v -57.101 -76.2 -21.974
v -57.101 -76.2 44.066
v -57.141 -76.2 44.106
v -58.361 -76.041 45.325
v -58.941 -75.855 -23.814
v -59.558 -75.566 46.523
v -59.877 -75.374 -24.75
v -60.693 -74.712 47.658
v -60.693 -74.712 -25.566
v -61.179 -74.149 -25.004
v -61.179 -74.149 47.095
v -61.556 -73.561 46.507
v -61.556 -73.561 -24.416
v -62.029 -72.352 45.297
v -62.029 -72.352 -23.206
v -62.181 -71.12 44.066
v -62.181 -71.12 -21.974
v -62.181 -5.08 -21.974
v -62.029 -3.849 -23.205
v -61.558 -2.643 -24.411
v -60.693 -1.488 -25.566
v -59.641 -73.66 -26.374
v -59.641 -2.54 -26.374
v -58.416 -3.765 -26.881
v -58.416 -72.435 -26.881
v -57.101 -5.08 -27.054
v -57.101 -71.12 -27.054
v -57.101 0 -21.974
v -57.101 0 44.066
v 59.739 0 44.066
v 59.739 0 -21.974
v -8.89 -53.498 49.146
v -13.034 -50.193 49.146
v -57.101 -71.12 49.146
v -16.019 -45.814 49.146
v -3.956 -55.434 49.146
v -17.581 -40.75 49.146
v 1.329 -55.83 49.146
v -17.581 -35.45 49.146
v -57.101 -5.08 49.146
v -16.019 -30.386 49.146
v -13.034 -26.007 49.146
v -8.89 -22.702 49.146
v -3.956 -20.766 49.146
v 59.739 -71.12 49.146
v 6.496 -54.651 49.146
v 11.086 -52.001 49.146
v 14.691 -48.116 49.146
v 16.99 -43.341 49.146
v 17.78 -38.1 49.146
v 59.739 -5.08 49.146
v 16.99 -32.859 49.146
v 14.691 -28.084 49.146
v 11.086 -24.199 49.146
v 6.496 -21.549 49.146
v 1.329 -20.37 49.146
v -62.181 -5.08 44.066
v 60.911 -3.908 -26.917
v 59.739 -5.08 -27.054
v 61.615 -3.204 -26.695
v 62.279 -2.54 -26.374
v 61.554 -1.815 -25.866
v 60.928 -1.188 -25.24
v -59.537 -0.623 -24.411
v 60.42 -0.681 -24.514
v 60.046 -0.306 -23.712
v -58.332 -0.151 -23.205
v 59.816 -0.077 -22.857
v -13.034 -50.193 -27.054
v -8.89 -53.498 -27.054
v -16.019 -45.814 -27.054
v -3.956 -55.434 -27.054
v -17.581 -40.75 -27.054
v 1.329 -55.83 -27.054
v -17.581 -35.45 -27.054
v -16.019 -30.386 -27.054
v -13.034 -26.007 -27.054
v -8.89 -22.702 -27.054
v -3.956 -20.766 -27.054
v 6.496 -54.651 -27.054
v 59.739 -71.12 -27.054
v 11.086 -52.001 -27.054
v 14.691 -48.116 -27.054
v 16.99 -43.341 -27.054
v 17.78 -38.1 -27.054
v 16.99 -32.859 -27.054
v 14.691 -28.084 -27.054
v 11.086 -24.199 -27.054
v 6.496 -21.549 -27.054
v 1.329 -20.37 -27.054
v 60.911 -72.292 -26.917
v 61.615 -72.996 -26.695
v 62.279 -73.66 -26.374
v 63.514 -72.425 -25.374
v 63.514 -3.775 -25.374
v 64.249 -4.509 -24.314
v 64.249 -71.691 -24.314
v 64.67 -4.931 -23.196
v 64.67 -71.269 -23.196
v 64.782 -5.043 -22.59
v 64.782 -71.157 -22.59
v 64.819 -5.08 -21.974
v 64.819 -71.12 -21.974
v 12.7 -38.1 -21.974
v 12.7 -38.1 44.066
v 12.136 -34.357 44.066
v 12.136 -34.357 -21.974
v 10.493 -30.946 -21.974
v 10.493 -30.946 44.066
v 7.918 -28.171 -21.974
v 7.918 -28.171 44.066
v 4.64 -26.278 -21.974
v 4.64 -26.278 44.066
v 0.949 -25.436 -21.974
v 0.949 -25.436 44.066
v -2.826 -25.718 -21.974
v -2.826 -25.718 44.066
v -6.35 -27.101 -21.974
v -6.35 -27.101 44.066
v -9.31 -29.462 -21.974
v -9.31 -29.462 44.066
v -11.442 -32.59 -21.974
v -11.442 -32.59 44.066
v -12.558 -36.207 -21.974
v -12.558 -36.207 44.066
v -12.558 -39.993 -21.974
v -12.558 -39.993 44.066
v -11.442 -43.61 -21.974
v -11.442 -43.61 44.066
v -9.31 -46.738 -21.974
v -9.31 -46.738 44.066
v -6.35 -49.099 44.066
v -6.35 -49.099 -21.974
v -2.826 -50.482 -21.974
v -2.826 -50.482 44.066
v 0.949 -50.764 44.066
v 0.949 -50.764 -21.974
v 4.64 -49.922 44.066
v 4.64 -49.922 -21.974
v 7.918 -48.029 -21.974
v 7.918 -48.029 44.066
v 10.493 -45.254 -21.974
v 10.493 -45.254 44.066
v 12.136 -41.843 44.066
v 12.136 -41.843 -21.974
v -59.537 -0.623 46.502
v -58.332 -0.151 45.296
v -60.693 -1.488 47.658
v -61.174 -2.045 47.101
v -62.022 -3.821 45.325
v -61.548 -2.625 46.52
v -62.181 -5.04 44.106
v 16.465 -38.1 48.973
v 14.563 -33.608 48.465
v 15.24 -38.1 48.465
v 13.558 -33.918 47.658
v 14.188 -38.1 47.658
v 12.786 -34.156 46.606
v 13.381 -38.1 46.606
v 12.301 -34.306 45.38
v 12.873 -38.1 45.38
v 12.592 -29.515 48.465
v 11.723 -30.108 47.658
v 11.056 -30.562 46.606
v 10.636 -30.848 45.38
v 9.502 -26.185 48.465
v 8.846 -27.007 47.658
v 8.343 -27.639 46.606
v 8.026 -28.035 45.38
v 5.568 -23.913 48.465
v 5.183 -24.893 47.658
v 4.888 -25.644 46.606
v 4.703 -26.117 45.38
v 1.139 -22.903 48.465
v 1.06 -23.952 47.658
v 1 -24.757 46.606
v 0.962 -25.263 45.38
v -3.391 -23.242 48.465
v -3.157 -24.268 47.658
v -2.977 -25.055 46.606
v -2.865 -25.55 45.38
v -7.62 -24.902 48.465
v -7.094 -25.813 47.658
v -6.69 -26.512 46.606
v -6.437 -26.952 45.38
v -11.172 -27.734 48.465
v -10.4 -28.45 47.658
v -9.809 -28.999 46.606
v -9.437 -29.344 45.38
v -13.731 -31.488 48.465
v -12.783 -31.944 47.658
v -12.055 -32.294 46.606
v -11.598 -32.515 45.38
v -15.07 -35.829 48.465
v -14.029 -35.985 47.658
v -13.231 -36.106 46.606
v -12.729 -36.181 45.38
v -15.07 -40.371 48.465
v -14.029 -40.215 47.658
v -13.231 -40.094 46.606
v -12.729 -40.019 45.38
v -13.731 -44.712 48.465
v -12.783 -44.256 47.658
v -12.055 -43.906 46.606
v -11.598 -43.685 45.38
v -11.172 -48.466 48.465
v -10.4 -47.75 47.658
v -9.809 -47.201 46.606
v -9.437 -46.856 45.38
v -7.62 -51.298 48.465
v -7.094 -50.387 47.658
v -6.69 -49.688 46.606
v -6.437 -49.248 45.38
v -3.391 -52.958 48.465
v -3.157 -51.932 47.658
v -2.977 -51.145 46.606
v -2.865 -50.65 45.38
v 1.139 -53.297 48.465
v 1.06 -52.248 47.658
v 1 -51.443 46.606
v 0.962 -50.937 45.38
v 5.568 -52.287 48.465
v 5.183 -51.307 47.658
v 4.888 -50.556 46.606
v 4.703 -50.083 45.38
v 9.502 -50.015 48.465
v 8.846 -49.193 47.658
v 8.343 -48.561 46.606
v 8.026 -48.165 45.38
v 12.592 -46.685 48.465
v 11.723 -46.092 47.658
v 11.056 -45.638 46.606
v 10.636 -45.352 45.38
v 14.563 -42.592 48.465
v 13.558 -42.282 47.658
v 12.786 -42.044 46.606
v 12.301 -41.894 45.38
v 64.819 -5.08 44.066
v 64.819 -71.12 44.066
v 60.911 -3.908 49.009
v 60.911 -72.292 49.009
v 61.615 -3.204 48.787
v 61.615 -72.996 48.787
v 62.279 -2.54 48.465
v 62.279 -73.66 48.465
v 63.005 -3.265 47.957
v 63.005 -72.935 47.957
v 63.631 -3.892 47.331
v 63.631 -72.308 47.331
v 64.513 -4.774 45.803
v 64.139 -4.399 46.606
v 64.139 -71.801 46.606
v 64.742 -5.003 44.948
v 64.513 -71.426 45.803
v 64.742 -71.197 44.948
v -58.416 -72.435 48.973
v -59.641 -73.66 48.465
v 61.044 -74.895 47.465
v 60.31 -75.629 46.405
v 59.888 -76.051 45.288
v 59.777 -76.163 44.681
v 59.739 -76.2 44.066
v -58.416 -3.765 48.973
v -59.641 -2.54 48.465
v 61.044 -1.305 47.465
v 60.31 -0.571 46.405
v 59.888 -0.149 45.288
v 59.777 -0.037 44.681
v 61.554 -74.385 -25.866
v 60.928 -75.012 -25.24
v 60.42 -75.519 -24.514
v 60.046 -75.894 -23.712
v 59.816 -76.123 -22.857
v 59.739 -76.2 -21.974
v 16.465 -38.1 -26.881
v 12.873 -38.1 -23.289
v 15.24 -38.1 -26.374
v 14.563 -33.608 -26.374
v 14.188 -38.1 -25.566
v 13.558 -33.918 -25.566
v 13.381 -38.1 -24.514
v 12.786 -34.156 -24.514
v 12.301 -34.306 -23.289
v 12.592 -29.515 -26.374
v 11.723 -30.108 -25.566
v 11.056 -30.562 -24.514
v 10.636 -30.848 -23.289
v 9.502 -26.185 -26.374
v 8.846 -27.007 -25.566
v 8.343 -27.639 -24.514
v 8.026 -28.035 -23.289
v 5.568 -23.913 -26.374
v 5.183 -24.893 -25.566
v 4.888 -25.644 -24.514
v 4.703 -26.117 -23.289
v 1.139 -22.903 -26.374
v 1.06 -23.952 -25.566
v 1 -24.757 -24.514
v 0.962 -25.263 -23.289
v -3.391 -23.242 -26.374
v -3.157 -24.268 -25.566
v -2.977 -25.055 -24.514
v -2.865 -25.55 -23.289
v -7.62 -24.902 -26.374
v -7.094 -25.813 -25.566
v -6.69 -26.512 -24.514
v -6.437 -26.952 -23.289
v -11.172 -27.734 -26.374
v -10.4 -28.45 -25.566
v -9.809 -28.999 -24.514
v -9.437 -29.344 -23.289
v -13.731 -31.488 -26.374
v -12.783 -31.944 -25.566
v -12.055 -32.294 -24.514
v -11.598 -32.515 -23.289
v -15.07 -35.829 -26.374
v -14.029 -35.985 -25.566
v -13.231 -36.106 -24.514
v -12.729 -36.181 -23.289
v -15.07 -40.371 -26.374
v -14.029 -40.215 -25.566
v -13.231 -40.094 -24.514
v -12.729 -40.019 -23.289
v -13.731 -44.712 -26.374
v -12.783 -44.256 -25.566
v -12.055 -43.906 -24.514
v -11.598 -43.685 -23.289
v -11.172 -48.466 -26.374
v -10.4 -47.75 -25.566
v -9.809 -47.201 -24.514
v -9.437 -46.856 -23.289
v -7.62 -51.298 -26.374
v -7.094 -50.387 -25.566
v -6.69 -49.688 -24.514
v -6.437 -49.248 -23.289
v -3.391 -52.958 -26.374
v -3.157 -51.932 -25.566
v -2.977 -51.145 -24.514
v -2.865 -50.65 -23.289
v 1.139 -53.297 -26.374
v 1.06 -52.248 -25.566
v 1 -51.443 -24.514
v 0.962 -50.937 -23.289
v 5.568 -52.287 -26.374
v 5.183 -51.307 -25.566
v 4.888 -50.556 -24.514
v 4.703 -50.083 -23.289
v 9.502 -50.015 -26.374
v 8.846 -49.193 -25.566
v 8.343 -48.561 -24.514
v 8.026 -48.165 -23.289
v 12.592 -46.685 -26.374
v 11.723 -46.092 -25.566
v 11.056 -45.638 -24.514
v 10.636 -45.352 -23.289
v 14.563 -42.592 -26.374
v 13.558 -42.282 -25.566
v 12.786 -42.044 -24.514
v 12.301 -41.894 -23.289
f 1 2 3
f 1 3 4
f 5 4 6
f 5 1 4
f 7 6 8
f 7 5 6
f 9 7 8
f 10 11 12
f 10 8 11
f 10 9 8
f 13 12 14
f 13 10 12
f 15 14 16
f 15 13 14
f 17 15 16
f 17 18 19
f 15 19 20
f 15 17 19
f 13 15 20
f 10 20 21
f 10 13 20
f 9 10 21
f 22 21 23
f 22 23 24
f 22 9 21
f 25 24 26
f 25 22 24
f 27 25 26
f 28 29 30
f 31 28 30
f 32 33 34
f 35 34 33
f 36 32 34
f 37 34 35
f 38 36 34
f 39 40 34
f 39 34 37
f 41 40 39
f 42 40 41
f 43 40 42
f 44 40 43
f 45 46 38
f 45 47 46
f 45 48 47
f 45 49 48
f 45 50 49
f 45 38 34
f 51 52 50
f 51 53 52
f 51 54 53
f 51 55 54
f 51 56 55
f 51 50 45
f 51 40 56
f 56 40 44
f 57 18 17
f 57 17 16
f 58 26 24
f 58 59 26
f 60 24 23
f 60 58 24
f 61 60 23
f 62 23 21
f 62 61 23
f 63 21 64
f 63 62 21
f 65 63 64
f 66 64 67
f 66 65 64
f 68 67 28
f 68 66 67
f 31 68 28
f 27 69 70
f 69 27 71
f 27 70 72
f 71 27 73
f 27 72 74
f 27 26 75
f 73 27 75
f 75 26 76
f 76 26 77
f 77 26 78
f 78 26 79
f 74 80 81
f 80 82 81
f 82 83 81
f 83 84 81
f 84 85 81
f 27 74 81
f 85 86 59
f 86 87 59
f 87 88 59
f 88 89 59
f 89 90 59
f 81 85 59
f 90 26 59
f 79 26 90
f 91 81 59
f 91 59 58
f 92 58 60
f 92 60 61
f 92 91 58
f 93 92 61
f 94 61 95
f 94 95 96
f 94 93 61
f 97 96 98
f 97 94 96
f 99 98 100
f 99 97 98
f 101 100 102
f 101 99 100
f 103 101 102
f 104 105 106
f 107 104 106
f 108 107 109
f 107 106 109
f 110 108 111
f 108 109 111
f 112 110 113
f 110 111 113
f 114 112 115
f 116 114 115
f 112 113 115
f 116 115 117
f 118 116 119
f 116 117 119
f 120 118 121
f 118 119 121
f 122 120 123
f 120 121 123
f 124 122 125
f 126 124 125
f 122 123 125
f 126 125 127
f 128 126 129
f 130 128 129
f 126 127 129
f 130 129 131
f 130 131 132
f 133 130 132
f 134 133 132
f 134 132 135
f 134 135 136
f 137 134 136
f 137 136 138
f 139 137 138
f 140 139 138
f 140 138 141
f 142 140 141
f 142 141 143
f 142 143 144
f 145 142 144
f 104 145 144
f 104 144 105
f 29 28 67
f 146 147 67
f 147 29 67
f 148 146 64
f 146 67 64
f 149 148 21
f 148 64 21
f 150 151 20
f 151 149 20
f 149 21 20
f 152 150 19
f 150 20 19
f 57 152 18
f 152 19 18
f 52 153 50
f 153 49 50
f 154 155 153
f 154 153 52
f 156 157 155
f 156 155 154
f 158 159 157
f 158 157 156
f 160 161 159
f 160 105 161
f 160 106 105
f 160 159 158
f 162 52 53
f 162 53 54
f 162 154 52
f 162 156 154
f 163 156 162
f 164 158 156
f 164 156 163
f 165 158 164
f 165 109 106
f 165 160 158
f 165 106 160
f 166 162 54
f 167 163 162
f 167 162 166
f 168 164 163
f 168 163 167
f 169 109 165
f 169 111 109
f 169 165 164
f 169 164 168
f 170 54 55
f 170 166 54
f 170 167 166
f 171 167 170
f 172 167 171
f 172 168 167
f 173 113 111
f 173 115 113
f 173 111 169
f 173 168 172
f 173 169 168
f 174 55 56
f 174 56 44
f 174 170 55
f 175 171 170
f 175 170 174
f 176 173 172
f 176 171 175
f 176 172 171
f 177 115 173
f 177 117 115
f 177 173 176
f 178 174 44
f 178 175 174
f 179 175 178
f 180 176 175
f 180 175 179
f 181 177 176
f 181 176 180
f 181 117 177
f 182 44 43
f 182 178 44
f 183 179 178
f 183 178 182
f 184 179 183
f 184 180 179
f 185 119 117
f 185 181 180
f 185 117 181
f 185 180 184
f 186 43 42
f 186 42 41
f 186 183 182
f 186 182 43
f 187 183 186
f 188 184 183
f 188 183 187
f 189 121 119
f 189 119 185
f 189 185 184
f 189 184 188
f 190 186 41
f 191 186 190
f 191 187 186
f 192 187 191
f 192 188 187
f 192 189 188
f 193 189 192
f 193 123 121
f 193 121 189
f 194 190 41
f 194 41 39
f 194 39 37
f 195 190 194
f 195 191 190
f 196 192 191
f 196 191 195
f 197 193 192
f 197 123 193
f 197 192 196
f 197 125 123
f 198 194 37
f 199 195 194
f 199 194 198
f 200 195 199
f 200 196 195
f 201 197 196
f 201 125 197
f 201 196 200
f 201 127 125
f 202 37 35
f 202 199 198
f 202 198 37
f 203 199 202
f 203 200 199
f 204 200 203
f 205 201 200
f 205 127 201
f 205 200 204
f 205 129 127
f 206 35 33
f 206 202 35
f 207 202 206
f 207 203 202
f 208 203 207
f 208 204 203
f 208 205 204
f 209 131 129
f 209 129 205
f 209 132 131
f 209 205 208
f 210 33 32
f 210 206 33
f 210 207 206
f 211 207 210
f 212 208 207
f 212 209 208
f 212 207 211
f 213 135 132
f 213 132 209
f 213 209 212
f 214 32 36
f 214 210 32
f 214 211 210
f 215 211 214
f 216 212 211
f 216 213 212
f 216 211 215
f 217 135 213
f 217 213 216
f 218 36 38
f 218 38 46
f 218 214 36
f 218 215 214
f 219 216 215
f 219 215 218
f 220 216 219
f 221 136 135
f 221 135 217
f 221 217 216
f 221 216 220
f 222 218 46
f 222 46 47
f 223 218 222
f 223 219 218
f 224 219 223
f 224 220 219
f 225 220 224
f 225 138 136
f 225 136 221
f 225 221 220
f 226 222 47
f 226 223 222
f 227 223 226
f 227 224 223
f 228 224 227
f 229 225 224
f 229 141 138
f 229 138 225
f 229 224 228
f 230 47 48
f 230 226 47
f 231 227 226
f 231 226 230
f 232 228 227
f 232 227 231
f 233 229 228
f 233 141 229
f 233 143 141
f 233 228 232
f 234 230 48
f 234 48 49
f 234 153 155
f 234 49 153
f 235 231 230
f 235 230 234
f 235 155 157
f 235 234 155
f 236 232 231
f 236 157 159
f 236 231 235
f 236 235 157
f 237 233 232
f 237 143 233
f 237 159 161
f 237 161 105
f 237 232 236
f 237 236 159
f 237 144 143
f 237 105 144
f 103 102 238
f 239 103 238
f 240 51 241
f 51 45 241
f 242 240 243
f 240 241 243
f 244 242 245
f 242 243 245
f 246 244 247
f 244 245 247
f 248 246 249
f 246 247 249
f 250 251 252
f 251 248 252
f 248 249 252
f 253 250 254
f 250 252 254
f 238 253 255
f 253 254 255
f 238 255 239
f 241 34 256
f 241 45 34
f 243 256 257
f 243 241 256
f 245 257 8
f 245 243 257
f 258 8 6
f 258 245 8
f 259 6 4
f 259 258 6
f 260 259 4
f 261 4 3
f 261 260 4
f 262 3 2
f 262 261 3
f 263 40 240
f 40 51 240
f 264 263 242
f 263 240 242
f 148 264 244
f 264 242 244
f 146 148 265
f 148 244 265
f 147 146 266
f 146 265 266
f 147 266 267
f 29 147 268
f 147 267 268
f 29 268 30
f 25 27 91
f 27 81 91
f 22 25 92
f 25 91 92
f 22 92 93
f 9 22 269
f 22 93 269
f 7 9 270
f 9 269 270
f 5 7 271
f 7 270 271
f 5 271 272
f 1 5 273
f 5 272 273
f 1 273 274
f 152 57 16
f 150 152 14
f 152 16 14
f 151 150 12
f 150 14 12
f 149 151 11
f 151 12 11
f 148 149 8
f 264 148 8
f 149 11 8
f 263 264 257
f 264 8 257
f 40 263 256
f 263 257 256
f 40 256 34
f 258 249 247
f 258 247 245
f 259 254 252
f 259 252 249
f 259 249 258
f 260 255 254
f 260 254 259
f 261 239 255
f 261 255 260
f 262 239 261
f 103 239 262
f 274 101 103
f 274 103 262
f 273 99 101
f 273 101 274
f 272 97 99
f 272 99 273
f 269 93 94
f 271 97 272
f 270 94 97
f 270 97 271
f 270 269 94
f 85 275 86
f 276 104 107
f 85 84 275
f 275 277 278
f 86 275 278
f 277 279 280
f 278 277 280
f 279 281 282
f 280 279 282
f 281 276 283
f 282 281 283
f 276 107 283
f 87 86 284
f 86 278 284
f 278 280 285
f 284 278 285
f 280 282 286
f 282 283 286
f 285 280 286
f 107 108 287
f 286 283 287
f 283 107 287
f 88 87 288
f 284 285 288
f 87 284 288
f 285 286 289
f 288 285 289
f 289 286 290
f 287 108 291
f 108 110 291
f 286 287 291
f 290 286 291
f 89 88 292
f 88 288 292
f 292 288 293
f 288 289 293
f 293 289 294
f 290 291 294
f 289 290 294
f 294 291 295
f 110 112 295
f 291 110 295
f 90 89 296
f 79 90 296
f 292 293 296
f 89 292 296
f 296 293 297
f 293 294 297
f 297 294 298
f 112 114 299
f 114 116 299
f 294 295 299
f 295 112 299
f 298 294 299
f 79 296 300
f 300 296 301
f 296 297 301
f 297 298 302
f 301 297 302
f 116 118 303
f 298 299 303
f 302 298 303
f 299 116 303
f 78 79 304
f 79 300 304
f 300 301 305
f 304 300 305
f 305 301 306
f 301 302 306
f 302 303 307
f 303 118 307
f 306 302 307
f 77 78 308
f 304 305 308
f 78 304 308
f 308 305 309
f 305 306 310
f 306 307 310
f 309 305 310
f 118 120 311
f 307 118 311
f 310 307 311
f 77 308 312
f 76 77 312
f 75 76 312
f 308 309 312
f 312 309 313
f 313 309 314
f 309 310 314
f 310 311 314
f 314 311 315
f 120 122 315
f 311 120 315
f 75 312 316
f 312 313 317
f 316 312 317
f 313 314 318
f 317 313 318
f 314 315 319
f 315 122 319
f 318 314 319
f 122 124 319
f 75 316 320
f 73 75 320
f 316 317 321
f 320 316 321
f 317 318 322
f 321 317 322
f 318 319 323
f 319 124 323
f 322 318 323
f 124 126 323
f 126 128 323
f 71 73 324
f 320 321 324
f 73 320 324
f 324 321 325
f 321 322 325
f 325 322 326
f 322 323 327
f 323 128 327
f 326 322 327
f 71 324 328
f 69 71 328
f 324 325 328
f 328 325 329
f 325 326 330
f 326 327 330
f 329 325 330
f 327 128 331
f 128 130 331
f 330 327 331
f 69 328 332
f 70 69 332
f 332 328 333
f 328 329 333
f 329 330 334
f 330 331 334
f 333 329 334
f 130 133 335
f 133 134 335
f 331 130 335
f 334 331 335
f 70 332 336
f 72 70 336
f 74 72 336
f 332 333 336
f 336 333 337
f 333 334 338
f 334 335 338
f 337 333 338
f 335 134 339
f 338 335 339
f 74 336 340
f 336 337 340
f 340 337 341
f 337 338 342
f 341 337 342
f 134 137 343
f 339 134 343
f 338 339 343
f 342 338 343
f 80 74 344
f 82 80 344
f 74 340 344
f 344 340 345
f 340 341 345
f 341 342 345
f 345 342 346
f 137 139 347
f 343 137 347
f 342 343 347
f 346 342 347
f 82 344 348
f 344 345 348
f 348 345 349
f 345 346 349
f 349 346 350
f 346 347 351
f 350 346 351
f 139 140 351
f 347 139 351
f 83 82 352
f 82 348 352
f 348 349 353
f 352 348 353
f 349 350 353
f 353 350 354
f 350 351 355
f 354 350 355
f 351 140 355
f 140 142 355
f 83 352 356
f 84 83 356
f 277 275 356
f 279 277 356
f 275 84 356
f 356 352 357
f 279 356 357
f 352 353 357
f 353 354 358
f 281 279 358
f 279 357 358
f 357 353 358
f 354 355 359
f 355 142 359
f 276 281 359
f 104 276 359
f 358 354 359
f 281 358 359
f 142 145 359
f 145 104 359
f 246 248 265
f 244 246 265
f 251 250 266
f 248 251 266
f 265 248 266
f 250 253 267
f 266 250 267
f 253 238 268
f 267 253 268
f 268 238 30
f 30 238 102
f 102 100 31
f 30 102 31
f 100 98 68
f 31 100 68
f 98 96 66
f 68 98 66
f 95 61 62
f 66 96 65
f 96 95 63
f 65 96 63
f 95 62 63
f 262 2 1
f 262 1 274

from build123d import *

# Parameters (mm, degrees)
F0_W        = 127
F0_H        = 76.2
F1_DEPTH    = 76.2
F2_R        = 12.7
F3_DEPTH    = 76.201
F4_R        = 5.08
F5_T1_DEPTH = 91.44
F6_T1_DEPTH = 92.1682991577


# Not quite as in the source:
# - a fillet or chamfer that OpenCascade refuses, or shapes differently, is made with other operations: its cross-section is extruded or revolved along the edge and cut away or added


with BuildPart() as f1:
    # F0 (on Front) → F1 (new body)
    with BuildSketch(Plane.XZ):
        with Locations((1.319276005, 11.0456193745)):
            Rectangle(F0_W, F0_H)
    extrude(amount=F1_DEPTH)

    # F2 (on face) → F3 (cut, through all)
    with BuildSketch(Plane.XY.offset(49.1456193745)):
        with Locations((0, -38.1)):
            Circle(F2_R)
    extrude(amount=-F3_DEPTH, mode=Mode.SUBTRACT)

    # F4
    f4_edges = [f1.edges().sort_by_distance(p)[0] for p in [
        (64.819276, -38.1, 49.145619),
        (1.319276, 0, 49.145619),
        (1.319276, -76.2, 49.145619),
        (-62.180724, -38.1, 49.145619),
        (-12.7, -38.1, 49.145619),
        (-62.180724, -38.1, -27.054381),
        (1.319276, 0, -27.054381),
        (1.319276, -76.2, -27.054381),
        (64.819276, -38.1, -27.054381),
        (-12.7, -38.1, -27.054381),
    ]]
    fillet(f4_edges, radius=F4_R)

    # F5: fillet of radius 5.08 on 4 edges, made by hand

    # F5_s2 → F5_t1 (cut)
    with BuildSketch(Plane.XY.offset(-34.6743806255)):
        with BuildLine():
            ThreePointArc((-57.100723995, 0), (-60.6928264434, -1.4878975516), (-62.180723995, -5.08))
            Line((-62.180723995, -5.08), (-62.180723995, 0))
            Line((-62.180723995, 0), (-57.100723995, 0))
        make_face()
        with BuildLine():
            ThreePointArc((-57.100723995, -76.2), (-60.6928264434, -74.7121024484), (-62.180723995, -71.12))
            Line((-62.180723995, -71.12), (-62.180723995, -76.2))
            Line((-62.180723995, -76.2), (-57.100723995, -76.2))
        make_face()
    extrude(amount=F5_T1_DEPTH, mode=Mode.SUBTRACT)

    # F6: chamfer of 5.08 on 4 edges, made by hand

    # F6_s2 → F6_t1 (cut)
    with BuildSketch(Plane.XY.offset(-35.0385302044)):
        Polygon((64.819276005, -5.08), (59.739276005, 0), (64.819276005, 0), align=None)
        Polygon((64.819276005, -71.12), (59.739276005, -76.2), (64.819276005, -76.2), align=None)
    extrude(amount=F6_T1_DEPTH, mode=Mode.SUBTRACT)


solid = f1.part
